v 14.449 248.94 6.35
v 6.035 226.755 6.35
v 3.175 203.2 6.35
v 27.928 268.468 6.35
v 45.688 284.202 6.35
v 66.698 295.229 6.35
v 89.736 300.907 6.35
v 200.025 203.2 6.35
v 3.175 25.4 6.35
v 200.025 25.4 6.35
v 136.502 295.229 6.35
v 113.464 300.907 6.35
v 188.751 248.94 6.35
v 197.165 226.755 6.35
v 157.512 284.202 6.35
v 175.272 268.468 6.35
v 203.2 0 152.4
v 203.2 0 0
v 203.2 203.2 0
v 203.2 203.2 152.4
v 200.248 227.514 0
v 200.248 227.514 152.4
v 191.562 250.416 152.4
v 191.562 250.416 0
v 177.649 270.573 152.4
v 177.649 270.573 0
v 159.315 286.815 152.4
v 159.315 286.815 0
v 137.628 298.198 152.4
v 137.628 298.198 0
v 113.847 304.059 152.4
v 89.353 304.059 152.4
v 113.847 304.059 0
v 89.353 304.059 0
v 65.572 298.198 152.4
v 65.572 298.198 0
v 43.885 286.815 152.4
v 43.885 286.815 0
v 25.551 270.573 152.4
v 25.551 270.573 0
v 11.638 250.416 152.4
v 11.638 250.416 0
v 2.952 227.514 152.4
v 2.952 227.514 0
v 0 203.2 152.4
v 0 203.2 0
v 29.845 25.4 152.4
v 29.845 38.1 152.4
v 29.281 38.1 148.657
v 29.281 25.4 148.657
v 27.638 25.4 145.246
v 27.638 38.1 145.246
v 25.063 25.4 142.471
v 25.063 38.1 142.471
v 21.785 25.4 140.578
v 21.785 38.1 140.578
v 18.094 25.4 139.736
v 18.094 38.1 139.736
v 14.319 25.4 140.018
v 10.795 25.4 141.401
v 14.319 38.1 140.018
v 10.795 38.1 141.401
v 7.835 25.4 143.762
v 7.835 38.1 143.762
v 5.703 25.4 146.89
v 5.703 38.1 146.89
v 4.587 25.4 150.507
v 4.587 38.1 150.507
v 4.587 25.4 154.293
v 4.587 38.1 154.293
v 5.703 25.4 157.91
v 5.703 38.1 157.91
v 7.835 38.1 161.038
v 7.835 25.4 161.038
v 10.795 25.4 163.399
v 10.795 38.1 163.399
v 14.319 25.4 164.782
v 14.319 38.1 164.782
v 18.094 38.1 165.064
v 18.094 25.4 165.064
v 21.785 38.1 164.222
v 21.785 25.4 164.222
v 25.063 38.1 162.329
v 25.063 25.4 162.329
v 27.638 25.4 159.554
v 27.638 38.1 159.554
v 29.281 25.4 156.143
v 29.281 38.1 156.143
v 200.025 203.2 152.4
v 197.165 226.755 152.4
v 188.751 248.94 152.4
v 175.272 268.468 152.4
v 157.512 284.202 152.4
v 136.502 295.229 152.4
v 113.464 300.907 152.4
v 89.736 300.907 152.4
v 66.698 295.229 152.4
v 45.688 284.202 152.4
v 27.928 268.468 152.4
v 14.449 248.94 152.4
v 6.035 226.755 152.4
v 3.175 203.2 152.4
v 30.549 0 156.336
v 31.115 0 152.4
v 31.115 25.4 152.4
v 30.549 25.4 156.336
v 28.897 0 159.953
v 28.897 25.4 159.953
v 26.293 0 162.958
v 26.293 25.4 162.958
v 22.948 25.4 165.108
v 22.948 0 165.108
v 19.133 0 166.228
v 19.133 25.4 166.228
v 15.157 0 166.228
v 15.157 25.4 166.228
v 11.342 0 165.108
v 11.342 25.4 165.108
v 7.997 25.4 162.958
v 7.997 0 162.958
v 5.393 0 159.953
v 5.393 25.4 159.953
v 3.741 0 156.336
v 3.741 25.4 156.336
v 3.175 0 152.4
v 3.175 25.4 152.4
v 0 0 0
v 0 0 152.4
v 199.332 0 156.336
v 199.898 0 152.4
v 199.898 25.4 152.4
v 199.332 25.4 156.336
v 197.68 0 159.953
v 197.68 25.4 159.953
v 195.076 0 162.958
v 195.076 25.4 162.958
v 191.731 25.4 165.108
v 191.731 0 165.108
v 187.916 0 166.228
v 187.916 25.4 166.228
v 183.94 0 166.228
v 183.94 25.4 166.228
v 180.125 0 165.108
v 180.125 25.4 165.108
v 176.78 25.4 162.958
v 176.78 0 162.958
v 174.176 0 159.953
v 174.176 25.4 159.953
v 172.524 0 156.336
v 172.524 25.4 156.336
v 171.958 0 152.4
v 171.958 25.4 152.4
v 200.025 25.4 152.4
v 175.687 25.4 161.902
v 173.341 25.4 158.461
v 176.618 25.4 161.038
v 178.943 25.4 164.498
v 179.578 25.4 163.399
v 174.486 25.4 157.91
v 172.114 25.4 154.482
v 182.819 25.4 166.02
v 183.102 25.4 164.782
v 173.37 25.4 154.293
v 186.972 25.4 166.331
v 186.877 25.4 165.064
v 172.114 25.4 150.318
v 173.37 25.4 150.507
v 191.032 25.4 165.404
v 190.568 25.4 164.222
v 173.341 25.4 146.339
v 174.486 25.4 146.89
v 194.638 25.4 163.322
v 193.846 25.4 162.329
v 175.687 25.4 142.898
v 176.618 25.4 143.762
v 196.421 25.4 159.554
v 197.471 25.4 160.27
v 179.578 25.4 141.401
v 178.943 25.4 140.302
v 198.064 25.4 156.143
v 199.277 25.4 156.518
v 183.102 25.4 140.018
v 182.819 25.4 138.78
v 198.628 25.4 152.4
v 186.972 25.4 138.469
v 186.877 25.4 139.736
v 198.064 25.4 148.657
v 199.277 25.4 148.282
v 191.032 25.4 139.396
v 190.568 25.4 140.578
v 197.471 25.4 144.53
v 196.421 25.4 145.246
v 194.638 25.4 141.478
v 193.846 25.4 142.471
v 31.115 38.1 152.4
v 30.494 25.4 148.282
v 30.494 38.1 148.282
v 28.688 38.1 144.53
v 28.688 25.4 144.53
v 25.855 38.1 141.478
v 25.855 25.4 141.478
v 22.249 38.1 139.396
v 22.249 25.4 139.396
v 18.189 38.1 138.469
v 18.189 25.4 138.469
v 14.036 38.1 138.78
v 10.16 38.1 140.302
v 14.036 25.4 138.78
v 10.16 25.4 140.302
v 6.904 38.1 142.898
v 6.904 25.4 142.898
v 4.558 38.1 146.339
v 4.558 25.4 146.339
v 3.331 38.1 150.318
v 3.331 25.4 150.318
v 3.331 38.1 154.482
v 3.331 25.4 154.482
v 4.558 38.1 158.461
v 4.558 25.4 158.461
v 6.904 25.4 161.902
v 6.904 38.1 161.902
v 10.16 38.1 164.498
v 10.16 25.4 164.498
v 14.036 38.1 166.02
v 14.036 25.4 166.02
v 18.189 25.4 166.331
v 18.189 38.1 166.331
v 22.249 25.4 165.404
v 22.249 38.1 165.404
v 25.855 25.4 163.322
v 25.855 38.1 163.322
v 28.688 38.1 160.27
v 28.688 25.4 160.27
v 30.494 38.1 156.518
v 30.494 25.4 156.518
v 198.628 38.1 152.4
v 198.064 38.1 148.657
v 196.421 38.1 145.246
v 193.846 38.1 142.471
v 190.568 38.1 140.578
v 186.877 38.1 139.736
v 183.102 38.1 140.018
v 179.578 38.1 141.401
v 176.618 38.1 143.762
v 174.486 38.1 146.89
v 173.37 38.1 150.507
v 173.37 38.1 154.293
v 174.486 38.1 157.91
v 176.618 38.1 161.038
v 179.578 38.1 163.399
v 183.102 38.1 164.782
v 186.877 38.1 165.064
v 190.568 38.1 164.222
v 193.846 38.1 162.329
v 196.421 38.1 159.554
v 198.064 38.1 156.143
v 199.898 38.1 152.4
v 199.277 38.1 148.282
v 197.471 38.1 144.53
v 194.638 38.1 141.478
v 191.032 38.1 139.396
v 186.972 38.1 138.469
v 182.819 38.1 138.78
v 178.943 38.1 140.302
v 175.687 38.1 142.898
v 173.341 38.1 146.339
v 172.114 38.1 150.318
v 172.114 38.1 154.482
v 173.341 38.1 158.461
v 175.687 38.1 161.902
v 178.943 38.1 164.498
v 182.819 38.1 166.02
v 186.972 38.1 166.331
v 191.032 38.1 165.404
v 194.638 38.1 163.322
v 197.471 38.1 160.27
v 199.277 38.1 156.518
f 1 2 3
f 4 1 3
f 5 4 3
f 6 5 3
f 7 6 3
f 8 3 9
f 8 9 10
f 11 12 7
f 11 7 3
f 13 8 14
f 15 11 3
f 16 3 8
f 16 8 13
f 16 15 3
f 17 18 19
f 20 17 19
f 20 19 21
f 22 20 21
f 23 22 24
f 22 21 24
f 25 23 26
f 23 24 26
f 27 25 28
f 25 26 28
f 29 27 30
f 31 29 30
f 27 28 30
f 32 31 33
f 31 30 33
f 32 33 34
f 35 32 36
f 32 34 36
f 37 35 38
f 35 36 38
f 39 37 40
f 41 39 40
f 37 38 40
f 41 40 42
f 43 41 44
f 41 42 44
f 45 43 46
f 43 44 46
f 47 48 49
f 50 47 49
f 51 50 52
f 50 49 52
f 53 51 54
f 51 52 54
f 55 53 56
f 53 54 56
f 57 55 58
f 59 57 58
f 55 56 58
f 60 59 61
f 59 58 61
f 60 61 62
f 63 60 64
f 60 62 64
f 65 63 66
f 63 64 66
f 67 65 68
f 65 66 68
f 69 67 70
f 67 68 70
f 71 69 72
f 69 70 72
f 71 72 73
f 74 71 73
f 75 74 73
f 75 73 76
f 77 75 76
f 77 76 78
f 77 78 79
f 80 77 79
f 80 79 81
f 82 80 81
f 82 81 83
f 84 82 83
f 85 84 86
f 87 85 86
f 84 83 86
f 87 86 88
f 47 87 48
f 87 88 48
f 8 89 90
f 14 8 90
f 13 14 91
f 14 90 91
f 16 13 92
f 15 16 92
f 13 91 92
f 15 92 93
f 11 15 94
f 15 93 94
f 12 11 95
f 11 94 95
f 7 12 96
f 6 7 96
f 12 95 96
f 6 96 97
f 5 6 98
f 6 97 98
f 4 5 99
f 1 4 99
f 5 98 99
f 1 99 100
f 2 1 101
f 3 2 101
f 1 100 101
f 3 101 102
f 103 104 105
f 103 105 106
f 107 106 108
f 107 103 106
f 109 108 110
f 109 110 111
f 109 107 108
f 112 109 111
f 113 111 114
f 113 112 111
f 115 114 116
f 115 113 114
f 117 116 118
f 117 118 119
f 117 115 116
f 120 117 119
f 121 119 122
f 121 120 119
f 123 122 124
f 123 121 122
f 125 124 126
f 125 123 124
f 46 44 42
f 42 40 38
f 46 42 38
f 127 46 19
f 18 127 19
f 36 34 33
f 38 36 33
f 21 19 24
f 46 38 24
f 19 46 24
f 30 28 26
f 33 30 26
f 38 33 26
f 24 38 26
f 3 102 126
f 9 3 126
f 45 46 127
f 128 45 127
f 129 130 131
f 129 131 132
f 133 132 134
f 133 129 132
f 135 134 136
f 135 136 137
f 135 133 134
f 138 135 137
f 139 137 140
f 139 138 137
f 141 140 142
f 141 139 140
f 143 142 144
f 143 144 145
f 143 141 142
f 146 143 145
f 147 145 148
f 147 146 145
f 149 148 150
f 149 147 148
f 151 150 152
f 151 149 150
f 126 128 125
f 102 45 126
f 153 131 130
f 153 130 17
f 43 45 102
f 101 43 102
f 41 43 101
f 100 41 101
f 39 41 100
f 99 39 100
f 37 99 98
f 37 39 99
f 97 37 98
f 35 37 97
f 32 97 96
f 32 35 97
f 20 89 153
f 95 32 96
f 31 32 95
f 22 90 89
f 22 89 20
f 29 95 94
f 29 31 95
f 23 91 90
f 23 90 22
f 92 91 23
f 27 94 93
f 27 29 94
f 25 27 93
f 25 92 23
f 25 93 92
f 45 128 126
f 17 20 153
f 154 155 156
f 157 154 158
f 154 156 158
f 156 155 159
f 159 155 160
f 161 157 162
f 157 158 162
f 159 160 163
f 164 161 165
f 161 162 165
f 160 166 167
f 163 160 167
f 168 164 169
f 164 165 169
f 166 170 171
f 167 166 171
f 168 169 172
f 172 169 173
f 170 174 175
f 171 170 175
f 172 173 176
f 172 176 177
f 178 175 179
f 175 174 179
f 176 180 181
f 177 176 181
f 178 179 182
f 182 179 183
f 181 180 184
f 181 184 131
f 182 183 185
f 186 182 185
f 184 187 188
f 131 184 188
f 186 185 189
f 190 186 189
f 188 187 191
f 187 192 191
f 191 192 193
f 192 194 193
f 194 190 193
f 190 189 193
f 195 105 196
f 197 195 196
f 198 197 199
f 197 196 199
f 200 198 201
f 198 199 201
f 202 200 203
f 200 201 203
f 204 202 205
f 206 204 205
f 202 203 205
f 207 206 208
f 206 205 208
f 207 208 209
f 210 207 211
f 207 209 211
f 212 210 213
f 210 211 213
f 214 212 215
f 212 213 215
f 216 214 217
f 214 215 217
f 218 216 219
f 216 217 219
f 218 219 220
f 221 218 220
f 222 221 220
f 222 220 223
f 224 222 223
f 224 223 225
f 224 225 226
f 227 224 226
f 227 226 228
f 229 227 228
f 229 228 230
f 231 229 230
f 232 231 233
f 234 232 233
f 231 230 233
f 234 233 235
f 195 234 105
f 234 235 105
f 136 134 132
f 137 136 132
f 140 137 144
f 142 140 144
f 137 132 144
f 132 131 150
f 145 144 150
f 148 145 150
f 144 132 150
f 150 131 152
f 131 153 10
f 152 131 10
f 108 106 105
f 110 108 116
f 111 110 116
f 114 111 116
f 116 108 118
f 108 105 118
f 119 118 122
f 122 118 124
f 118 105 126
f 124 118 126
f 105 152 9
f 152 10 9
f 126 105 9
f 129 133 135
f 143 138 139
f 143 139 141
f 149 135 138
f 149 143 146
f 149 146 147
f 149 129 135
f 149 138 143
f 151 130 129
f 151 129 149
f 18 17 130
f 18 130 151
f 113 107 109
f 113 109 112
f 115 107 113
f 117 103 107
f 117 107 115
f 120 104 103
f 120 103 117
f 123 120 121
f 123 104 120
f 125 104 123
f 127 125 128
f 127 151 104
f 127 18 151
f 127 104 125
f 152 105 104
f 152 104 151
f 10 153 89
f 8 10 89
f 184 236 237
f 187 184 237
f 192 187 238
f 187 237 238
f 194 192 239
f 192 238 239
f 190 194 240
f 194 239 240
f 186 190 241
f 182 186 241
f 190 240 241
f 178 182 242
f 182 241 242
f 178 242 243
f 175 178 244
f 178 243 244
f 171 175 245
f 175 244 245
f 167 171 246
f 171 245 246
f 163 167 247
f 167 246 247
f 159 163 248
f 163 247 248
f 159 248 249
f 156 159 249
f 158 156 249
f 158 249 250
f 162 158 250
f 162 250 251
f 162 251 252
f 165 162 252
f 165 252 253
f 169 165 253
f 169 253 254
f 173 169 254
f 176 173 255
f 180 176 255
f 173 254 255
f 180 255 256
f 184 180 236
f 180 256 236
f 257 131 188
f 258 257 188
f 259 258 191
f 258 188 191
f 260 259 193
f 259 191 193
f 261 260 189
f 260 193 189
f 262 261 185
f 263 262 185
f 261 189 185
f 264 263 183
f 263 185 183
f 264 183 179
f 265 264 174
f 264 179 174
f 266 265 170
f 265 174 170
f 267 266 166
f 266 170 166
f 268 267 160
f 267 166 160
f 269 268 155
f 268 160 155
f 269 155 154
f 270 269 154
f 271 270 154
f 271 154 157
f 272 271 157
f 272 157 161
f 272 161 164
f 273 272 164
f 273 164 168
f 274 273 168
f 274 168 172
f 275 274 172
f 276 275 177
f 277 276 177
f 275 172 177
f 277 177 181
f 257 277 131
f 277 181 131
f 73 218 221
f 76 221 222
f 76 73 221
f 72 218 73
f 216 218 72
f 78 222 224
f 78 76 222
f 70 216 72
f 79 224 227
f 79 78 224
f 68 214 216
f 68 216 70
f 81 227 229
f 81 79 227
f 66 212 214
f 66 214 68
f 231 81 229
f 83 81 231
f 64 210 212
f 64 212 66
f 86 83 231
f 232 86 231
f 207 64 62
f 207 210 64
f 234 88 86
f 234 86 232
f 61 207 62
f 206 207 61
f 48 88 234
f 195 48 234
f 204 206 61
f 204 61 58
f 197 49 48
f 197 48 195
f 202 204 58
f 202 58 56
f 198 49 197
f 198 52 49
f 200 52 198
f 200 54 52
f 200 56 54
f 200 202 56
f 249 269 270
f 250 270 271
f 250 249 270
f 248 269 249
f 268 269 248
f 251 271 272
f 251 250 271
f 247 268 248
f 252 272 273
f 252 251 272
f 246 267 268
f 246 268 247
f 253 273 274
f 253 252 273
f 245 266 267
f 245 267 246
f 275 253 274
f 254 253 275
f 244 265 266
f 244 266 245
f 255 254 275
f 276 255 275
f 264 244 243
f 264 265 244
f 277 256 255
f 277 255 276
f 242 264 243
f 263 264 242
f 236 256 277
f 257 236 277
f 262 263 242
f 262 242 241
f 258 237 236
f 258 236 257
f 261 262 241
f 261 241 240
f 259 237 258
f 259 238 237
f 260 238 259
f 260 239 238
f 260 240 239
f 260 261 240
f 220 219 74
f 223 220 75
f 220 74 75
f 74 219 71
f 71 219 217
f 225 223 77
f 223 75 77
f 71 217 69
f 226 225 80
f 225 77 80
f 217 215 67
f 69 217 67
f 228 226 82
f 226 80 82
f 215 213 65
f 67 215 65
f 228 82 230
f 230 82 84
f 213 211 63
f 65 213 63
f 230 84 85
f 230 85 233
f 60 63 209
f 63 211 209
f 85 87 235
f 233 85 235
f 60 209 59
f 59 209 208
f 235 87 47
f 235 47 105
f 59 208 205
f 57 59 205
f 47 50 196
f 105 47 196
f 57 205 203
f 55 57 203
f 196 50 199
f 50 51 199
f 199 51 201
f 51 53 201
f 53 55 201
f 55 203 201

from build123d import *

# Parameters (mm, degrees)
BOSS_EXTRUDE1_DEPTH    = 152.4
CUT_EXTRUDE1_DEPTH     = 146.05
BOSS_EXTRUDE4_DEPTH    = 25.4
SKETCH5_R              = 13.97
BOSS_EXTRUDE10_DEPTH   = 12.7
BOSS_EXTRUDE10_2_DEPTH = 12.7
SKETCH6_R              = 12.7
CUT_EXTRUDE2_DEPTH     = 12.7


with BuildPart() as part:
    # Sketch1 → Boss-Extrude1 (new body)
    with BuildSketch(Plane.XY):
        with BuildLine():
            Line((0, 203.2), (0, 0))
            Line((0, 0), (203.2, 0))
            Line((203.2, 0), (203.2, 203.2))
            ThreePointArc((203.2, 203.2), (101.6, 304.8), (0, 203.2))
        make_face()
    extrude(amount=BOSS_EXTRUDE1_DEPTH)

    # Sketch2 → Cut-Extrude1 (cut)
    with BuildSketch(Plane.XY.offset(152.4)):
        with BuildLine():
            Line((3.175, 203.2), (3.175, 25.4))
            Line((3.175, 25.4), (200.025, 25.4))
            Line((200.025, 25.4), (200.025, 203.2))
            ThreePointArc((200.025, 203.2), (101.6, 301.625), (3.175, 203.2))
        make_face()
    extrude(amount=-CUT_EXTRUDE1_DEPTH, mode=Mode.SUBTRACT)

    # Sketch4 → Boss-Extrude4 (add)
    with BuildSketch(Plane(origin=(0, 0, 0), x_dir=(1, 0, 0), z_dir=(0, 1, 0))):
        with BuildLine():
            ThreePointArc((31.115, -152.4), (17.145, -166.37), (3.175, -152.4))
            Line((3.175, -152.4), (31.115, -152.4))
        make_face()
        with BuildLine():
            Line((171.958, -152.4), (199.898, -152.4))
            ThreePointArc((199.898, -152.4), (185.928, -166.37), (171.958, -152.4))
        make_face()
    extrude(amount=BOSS_EXTRUDE4_DEPTH)


with BuildPart() as body_2:
    # Sketch5 → Boss-Extrude10 (new body)
    with BuildSketch(Plane(origin=(0, 25.4, 0), x_dir=(1, 0, 0), z_dir=(0, 1, 0))):
        with Locations((17.145, -152.4)):
            Circle(SKETCH5_R)
    extrude(amount=BOSS_EXTRUDE10_DEPTH)


with BuildPart() as body_3:
    # Sketch5 → Boss-Extrude10 2 (new body)
    with BuildSketch(Plane(origin=(0, 25.4, 0), x_dir=(1, 0, 0), z_dir=(0, 1, 0))):
        with Locations((185.928, -152.4)):
            Circle(SKETCH5_R)
    extrude(amount=BOSS_EXTRUDE10_2_DEPTH)


with BuildPart() as cut_extrude2_tool:
    # Sketch6 → Cut-Extrude2 (new body)
    with BuildSketch(Plane(origin=(0, 38.1, 0), x_dir=(1, 0, 0), z_dir=(0, 1, 0))):
        with Locations((17.145, -152.4)):
            Circle(SKETCH6_R)
        with Locations((185.928, -152.4)):
            Circle(SKETCH6_R)
    extrude(amount=-CUT_EXTRUDE2_DEPTH)


with BuildPart() as body_2_1:
    add(body_2.part)

    # Cut-Extrude2: cut by cut_extrude2_tool
    add(cut_extrude2_tool.part, mode=Mode.SUBTRACT)


with BuildPart() as body_3_1:
    add(body_3.part)

    # Cut-Extrude2: cut by cut_extrude2_tool
    add(cut_extrude2_tool.part, mode=Mode.SUBTRACT)


solid = Compound([part.part, body_2_1.part, body_3_1.part])
